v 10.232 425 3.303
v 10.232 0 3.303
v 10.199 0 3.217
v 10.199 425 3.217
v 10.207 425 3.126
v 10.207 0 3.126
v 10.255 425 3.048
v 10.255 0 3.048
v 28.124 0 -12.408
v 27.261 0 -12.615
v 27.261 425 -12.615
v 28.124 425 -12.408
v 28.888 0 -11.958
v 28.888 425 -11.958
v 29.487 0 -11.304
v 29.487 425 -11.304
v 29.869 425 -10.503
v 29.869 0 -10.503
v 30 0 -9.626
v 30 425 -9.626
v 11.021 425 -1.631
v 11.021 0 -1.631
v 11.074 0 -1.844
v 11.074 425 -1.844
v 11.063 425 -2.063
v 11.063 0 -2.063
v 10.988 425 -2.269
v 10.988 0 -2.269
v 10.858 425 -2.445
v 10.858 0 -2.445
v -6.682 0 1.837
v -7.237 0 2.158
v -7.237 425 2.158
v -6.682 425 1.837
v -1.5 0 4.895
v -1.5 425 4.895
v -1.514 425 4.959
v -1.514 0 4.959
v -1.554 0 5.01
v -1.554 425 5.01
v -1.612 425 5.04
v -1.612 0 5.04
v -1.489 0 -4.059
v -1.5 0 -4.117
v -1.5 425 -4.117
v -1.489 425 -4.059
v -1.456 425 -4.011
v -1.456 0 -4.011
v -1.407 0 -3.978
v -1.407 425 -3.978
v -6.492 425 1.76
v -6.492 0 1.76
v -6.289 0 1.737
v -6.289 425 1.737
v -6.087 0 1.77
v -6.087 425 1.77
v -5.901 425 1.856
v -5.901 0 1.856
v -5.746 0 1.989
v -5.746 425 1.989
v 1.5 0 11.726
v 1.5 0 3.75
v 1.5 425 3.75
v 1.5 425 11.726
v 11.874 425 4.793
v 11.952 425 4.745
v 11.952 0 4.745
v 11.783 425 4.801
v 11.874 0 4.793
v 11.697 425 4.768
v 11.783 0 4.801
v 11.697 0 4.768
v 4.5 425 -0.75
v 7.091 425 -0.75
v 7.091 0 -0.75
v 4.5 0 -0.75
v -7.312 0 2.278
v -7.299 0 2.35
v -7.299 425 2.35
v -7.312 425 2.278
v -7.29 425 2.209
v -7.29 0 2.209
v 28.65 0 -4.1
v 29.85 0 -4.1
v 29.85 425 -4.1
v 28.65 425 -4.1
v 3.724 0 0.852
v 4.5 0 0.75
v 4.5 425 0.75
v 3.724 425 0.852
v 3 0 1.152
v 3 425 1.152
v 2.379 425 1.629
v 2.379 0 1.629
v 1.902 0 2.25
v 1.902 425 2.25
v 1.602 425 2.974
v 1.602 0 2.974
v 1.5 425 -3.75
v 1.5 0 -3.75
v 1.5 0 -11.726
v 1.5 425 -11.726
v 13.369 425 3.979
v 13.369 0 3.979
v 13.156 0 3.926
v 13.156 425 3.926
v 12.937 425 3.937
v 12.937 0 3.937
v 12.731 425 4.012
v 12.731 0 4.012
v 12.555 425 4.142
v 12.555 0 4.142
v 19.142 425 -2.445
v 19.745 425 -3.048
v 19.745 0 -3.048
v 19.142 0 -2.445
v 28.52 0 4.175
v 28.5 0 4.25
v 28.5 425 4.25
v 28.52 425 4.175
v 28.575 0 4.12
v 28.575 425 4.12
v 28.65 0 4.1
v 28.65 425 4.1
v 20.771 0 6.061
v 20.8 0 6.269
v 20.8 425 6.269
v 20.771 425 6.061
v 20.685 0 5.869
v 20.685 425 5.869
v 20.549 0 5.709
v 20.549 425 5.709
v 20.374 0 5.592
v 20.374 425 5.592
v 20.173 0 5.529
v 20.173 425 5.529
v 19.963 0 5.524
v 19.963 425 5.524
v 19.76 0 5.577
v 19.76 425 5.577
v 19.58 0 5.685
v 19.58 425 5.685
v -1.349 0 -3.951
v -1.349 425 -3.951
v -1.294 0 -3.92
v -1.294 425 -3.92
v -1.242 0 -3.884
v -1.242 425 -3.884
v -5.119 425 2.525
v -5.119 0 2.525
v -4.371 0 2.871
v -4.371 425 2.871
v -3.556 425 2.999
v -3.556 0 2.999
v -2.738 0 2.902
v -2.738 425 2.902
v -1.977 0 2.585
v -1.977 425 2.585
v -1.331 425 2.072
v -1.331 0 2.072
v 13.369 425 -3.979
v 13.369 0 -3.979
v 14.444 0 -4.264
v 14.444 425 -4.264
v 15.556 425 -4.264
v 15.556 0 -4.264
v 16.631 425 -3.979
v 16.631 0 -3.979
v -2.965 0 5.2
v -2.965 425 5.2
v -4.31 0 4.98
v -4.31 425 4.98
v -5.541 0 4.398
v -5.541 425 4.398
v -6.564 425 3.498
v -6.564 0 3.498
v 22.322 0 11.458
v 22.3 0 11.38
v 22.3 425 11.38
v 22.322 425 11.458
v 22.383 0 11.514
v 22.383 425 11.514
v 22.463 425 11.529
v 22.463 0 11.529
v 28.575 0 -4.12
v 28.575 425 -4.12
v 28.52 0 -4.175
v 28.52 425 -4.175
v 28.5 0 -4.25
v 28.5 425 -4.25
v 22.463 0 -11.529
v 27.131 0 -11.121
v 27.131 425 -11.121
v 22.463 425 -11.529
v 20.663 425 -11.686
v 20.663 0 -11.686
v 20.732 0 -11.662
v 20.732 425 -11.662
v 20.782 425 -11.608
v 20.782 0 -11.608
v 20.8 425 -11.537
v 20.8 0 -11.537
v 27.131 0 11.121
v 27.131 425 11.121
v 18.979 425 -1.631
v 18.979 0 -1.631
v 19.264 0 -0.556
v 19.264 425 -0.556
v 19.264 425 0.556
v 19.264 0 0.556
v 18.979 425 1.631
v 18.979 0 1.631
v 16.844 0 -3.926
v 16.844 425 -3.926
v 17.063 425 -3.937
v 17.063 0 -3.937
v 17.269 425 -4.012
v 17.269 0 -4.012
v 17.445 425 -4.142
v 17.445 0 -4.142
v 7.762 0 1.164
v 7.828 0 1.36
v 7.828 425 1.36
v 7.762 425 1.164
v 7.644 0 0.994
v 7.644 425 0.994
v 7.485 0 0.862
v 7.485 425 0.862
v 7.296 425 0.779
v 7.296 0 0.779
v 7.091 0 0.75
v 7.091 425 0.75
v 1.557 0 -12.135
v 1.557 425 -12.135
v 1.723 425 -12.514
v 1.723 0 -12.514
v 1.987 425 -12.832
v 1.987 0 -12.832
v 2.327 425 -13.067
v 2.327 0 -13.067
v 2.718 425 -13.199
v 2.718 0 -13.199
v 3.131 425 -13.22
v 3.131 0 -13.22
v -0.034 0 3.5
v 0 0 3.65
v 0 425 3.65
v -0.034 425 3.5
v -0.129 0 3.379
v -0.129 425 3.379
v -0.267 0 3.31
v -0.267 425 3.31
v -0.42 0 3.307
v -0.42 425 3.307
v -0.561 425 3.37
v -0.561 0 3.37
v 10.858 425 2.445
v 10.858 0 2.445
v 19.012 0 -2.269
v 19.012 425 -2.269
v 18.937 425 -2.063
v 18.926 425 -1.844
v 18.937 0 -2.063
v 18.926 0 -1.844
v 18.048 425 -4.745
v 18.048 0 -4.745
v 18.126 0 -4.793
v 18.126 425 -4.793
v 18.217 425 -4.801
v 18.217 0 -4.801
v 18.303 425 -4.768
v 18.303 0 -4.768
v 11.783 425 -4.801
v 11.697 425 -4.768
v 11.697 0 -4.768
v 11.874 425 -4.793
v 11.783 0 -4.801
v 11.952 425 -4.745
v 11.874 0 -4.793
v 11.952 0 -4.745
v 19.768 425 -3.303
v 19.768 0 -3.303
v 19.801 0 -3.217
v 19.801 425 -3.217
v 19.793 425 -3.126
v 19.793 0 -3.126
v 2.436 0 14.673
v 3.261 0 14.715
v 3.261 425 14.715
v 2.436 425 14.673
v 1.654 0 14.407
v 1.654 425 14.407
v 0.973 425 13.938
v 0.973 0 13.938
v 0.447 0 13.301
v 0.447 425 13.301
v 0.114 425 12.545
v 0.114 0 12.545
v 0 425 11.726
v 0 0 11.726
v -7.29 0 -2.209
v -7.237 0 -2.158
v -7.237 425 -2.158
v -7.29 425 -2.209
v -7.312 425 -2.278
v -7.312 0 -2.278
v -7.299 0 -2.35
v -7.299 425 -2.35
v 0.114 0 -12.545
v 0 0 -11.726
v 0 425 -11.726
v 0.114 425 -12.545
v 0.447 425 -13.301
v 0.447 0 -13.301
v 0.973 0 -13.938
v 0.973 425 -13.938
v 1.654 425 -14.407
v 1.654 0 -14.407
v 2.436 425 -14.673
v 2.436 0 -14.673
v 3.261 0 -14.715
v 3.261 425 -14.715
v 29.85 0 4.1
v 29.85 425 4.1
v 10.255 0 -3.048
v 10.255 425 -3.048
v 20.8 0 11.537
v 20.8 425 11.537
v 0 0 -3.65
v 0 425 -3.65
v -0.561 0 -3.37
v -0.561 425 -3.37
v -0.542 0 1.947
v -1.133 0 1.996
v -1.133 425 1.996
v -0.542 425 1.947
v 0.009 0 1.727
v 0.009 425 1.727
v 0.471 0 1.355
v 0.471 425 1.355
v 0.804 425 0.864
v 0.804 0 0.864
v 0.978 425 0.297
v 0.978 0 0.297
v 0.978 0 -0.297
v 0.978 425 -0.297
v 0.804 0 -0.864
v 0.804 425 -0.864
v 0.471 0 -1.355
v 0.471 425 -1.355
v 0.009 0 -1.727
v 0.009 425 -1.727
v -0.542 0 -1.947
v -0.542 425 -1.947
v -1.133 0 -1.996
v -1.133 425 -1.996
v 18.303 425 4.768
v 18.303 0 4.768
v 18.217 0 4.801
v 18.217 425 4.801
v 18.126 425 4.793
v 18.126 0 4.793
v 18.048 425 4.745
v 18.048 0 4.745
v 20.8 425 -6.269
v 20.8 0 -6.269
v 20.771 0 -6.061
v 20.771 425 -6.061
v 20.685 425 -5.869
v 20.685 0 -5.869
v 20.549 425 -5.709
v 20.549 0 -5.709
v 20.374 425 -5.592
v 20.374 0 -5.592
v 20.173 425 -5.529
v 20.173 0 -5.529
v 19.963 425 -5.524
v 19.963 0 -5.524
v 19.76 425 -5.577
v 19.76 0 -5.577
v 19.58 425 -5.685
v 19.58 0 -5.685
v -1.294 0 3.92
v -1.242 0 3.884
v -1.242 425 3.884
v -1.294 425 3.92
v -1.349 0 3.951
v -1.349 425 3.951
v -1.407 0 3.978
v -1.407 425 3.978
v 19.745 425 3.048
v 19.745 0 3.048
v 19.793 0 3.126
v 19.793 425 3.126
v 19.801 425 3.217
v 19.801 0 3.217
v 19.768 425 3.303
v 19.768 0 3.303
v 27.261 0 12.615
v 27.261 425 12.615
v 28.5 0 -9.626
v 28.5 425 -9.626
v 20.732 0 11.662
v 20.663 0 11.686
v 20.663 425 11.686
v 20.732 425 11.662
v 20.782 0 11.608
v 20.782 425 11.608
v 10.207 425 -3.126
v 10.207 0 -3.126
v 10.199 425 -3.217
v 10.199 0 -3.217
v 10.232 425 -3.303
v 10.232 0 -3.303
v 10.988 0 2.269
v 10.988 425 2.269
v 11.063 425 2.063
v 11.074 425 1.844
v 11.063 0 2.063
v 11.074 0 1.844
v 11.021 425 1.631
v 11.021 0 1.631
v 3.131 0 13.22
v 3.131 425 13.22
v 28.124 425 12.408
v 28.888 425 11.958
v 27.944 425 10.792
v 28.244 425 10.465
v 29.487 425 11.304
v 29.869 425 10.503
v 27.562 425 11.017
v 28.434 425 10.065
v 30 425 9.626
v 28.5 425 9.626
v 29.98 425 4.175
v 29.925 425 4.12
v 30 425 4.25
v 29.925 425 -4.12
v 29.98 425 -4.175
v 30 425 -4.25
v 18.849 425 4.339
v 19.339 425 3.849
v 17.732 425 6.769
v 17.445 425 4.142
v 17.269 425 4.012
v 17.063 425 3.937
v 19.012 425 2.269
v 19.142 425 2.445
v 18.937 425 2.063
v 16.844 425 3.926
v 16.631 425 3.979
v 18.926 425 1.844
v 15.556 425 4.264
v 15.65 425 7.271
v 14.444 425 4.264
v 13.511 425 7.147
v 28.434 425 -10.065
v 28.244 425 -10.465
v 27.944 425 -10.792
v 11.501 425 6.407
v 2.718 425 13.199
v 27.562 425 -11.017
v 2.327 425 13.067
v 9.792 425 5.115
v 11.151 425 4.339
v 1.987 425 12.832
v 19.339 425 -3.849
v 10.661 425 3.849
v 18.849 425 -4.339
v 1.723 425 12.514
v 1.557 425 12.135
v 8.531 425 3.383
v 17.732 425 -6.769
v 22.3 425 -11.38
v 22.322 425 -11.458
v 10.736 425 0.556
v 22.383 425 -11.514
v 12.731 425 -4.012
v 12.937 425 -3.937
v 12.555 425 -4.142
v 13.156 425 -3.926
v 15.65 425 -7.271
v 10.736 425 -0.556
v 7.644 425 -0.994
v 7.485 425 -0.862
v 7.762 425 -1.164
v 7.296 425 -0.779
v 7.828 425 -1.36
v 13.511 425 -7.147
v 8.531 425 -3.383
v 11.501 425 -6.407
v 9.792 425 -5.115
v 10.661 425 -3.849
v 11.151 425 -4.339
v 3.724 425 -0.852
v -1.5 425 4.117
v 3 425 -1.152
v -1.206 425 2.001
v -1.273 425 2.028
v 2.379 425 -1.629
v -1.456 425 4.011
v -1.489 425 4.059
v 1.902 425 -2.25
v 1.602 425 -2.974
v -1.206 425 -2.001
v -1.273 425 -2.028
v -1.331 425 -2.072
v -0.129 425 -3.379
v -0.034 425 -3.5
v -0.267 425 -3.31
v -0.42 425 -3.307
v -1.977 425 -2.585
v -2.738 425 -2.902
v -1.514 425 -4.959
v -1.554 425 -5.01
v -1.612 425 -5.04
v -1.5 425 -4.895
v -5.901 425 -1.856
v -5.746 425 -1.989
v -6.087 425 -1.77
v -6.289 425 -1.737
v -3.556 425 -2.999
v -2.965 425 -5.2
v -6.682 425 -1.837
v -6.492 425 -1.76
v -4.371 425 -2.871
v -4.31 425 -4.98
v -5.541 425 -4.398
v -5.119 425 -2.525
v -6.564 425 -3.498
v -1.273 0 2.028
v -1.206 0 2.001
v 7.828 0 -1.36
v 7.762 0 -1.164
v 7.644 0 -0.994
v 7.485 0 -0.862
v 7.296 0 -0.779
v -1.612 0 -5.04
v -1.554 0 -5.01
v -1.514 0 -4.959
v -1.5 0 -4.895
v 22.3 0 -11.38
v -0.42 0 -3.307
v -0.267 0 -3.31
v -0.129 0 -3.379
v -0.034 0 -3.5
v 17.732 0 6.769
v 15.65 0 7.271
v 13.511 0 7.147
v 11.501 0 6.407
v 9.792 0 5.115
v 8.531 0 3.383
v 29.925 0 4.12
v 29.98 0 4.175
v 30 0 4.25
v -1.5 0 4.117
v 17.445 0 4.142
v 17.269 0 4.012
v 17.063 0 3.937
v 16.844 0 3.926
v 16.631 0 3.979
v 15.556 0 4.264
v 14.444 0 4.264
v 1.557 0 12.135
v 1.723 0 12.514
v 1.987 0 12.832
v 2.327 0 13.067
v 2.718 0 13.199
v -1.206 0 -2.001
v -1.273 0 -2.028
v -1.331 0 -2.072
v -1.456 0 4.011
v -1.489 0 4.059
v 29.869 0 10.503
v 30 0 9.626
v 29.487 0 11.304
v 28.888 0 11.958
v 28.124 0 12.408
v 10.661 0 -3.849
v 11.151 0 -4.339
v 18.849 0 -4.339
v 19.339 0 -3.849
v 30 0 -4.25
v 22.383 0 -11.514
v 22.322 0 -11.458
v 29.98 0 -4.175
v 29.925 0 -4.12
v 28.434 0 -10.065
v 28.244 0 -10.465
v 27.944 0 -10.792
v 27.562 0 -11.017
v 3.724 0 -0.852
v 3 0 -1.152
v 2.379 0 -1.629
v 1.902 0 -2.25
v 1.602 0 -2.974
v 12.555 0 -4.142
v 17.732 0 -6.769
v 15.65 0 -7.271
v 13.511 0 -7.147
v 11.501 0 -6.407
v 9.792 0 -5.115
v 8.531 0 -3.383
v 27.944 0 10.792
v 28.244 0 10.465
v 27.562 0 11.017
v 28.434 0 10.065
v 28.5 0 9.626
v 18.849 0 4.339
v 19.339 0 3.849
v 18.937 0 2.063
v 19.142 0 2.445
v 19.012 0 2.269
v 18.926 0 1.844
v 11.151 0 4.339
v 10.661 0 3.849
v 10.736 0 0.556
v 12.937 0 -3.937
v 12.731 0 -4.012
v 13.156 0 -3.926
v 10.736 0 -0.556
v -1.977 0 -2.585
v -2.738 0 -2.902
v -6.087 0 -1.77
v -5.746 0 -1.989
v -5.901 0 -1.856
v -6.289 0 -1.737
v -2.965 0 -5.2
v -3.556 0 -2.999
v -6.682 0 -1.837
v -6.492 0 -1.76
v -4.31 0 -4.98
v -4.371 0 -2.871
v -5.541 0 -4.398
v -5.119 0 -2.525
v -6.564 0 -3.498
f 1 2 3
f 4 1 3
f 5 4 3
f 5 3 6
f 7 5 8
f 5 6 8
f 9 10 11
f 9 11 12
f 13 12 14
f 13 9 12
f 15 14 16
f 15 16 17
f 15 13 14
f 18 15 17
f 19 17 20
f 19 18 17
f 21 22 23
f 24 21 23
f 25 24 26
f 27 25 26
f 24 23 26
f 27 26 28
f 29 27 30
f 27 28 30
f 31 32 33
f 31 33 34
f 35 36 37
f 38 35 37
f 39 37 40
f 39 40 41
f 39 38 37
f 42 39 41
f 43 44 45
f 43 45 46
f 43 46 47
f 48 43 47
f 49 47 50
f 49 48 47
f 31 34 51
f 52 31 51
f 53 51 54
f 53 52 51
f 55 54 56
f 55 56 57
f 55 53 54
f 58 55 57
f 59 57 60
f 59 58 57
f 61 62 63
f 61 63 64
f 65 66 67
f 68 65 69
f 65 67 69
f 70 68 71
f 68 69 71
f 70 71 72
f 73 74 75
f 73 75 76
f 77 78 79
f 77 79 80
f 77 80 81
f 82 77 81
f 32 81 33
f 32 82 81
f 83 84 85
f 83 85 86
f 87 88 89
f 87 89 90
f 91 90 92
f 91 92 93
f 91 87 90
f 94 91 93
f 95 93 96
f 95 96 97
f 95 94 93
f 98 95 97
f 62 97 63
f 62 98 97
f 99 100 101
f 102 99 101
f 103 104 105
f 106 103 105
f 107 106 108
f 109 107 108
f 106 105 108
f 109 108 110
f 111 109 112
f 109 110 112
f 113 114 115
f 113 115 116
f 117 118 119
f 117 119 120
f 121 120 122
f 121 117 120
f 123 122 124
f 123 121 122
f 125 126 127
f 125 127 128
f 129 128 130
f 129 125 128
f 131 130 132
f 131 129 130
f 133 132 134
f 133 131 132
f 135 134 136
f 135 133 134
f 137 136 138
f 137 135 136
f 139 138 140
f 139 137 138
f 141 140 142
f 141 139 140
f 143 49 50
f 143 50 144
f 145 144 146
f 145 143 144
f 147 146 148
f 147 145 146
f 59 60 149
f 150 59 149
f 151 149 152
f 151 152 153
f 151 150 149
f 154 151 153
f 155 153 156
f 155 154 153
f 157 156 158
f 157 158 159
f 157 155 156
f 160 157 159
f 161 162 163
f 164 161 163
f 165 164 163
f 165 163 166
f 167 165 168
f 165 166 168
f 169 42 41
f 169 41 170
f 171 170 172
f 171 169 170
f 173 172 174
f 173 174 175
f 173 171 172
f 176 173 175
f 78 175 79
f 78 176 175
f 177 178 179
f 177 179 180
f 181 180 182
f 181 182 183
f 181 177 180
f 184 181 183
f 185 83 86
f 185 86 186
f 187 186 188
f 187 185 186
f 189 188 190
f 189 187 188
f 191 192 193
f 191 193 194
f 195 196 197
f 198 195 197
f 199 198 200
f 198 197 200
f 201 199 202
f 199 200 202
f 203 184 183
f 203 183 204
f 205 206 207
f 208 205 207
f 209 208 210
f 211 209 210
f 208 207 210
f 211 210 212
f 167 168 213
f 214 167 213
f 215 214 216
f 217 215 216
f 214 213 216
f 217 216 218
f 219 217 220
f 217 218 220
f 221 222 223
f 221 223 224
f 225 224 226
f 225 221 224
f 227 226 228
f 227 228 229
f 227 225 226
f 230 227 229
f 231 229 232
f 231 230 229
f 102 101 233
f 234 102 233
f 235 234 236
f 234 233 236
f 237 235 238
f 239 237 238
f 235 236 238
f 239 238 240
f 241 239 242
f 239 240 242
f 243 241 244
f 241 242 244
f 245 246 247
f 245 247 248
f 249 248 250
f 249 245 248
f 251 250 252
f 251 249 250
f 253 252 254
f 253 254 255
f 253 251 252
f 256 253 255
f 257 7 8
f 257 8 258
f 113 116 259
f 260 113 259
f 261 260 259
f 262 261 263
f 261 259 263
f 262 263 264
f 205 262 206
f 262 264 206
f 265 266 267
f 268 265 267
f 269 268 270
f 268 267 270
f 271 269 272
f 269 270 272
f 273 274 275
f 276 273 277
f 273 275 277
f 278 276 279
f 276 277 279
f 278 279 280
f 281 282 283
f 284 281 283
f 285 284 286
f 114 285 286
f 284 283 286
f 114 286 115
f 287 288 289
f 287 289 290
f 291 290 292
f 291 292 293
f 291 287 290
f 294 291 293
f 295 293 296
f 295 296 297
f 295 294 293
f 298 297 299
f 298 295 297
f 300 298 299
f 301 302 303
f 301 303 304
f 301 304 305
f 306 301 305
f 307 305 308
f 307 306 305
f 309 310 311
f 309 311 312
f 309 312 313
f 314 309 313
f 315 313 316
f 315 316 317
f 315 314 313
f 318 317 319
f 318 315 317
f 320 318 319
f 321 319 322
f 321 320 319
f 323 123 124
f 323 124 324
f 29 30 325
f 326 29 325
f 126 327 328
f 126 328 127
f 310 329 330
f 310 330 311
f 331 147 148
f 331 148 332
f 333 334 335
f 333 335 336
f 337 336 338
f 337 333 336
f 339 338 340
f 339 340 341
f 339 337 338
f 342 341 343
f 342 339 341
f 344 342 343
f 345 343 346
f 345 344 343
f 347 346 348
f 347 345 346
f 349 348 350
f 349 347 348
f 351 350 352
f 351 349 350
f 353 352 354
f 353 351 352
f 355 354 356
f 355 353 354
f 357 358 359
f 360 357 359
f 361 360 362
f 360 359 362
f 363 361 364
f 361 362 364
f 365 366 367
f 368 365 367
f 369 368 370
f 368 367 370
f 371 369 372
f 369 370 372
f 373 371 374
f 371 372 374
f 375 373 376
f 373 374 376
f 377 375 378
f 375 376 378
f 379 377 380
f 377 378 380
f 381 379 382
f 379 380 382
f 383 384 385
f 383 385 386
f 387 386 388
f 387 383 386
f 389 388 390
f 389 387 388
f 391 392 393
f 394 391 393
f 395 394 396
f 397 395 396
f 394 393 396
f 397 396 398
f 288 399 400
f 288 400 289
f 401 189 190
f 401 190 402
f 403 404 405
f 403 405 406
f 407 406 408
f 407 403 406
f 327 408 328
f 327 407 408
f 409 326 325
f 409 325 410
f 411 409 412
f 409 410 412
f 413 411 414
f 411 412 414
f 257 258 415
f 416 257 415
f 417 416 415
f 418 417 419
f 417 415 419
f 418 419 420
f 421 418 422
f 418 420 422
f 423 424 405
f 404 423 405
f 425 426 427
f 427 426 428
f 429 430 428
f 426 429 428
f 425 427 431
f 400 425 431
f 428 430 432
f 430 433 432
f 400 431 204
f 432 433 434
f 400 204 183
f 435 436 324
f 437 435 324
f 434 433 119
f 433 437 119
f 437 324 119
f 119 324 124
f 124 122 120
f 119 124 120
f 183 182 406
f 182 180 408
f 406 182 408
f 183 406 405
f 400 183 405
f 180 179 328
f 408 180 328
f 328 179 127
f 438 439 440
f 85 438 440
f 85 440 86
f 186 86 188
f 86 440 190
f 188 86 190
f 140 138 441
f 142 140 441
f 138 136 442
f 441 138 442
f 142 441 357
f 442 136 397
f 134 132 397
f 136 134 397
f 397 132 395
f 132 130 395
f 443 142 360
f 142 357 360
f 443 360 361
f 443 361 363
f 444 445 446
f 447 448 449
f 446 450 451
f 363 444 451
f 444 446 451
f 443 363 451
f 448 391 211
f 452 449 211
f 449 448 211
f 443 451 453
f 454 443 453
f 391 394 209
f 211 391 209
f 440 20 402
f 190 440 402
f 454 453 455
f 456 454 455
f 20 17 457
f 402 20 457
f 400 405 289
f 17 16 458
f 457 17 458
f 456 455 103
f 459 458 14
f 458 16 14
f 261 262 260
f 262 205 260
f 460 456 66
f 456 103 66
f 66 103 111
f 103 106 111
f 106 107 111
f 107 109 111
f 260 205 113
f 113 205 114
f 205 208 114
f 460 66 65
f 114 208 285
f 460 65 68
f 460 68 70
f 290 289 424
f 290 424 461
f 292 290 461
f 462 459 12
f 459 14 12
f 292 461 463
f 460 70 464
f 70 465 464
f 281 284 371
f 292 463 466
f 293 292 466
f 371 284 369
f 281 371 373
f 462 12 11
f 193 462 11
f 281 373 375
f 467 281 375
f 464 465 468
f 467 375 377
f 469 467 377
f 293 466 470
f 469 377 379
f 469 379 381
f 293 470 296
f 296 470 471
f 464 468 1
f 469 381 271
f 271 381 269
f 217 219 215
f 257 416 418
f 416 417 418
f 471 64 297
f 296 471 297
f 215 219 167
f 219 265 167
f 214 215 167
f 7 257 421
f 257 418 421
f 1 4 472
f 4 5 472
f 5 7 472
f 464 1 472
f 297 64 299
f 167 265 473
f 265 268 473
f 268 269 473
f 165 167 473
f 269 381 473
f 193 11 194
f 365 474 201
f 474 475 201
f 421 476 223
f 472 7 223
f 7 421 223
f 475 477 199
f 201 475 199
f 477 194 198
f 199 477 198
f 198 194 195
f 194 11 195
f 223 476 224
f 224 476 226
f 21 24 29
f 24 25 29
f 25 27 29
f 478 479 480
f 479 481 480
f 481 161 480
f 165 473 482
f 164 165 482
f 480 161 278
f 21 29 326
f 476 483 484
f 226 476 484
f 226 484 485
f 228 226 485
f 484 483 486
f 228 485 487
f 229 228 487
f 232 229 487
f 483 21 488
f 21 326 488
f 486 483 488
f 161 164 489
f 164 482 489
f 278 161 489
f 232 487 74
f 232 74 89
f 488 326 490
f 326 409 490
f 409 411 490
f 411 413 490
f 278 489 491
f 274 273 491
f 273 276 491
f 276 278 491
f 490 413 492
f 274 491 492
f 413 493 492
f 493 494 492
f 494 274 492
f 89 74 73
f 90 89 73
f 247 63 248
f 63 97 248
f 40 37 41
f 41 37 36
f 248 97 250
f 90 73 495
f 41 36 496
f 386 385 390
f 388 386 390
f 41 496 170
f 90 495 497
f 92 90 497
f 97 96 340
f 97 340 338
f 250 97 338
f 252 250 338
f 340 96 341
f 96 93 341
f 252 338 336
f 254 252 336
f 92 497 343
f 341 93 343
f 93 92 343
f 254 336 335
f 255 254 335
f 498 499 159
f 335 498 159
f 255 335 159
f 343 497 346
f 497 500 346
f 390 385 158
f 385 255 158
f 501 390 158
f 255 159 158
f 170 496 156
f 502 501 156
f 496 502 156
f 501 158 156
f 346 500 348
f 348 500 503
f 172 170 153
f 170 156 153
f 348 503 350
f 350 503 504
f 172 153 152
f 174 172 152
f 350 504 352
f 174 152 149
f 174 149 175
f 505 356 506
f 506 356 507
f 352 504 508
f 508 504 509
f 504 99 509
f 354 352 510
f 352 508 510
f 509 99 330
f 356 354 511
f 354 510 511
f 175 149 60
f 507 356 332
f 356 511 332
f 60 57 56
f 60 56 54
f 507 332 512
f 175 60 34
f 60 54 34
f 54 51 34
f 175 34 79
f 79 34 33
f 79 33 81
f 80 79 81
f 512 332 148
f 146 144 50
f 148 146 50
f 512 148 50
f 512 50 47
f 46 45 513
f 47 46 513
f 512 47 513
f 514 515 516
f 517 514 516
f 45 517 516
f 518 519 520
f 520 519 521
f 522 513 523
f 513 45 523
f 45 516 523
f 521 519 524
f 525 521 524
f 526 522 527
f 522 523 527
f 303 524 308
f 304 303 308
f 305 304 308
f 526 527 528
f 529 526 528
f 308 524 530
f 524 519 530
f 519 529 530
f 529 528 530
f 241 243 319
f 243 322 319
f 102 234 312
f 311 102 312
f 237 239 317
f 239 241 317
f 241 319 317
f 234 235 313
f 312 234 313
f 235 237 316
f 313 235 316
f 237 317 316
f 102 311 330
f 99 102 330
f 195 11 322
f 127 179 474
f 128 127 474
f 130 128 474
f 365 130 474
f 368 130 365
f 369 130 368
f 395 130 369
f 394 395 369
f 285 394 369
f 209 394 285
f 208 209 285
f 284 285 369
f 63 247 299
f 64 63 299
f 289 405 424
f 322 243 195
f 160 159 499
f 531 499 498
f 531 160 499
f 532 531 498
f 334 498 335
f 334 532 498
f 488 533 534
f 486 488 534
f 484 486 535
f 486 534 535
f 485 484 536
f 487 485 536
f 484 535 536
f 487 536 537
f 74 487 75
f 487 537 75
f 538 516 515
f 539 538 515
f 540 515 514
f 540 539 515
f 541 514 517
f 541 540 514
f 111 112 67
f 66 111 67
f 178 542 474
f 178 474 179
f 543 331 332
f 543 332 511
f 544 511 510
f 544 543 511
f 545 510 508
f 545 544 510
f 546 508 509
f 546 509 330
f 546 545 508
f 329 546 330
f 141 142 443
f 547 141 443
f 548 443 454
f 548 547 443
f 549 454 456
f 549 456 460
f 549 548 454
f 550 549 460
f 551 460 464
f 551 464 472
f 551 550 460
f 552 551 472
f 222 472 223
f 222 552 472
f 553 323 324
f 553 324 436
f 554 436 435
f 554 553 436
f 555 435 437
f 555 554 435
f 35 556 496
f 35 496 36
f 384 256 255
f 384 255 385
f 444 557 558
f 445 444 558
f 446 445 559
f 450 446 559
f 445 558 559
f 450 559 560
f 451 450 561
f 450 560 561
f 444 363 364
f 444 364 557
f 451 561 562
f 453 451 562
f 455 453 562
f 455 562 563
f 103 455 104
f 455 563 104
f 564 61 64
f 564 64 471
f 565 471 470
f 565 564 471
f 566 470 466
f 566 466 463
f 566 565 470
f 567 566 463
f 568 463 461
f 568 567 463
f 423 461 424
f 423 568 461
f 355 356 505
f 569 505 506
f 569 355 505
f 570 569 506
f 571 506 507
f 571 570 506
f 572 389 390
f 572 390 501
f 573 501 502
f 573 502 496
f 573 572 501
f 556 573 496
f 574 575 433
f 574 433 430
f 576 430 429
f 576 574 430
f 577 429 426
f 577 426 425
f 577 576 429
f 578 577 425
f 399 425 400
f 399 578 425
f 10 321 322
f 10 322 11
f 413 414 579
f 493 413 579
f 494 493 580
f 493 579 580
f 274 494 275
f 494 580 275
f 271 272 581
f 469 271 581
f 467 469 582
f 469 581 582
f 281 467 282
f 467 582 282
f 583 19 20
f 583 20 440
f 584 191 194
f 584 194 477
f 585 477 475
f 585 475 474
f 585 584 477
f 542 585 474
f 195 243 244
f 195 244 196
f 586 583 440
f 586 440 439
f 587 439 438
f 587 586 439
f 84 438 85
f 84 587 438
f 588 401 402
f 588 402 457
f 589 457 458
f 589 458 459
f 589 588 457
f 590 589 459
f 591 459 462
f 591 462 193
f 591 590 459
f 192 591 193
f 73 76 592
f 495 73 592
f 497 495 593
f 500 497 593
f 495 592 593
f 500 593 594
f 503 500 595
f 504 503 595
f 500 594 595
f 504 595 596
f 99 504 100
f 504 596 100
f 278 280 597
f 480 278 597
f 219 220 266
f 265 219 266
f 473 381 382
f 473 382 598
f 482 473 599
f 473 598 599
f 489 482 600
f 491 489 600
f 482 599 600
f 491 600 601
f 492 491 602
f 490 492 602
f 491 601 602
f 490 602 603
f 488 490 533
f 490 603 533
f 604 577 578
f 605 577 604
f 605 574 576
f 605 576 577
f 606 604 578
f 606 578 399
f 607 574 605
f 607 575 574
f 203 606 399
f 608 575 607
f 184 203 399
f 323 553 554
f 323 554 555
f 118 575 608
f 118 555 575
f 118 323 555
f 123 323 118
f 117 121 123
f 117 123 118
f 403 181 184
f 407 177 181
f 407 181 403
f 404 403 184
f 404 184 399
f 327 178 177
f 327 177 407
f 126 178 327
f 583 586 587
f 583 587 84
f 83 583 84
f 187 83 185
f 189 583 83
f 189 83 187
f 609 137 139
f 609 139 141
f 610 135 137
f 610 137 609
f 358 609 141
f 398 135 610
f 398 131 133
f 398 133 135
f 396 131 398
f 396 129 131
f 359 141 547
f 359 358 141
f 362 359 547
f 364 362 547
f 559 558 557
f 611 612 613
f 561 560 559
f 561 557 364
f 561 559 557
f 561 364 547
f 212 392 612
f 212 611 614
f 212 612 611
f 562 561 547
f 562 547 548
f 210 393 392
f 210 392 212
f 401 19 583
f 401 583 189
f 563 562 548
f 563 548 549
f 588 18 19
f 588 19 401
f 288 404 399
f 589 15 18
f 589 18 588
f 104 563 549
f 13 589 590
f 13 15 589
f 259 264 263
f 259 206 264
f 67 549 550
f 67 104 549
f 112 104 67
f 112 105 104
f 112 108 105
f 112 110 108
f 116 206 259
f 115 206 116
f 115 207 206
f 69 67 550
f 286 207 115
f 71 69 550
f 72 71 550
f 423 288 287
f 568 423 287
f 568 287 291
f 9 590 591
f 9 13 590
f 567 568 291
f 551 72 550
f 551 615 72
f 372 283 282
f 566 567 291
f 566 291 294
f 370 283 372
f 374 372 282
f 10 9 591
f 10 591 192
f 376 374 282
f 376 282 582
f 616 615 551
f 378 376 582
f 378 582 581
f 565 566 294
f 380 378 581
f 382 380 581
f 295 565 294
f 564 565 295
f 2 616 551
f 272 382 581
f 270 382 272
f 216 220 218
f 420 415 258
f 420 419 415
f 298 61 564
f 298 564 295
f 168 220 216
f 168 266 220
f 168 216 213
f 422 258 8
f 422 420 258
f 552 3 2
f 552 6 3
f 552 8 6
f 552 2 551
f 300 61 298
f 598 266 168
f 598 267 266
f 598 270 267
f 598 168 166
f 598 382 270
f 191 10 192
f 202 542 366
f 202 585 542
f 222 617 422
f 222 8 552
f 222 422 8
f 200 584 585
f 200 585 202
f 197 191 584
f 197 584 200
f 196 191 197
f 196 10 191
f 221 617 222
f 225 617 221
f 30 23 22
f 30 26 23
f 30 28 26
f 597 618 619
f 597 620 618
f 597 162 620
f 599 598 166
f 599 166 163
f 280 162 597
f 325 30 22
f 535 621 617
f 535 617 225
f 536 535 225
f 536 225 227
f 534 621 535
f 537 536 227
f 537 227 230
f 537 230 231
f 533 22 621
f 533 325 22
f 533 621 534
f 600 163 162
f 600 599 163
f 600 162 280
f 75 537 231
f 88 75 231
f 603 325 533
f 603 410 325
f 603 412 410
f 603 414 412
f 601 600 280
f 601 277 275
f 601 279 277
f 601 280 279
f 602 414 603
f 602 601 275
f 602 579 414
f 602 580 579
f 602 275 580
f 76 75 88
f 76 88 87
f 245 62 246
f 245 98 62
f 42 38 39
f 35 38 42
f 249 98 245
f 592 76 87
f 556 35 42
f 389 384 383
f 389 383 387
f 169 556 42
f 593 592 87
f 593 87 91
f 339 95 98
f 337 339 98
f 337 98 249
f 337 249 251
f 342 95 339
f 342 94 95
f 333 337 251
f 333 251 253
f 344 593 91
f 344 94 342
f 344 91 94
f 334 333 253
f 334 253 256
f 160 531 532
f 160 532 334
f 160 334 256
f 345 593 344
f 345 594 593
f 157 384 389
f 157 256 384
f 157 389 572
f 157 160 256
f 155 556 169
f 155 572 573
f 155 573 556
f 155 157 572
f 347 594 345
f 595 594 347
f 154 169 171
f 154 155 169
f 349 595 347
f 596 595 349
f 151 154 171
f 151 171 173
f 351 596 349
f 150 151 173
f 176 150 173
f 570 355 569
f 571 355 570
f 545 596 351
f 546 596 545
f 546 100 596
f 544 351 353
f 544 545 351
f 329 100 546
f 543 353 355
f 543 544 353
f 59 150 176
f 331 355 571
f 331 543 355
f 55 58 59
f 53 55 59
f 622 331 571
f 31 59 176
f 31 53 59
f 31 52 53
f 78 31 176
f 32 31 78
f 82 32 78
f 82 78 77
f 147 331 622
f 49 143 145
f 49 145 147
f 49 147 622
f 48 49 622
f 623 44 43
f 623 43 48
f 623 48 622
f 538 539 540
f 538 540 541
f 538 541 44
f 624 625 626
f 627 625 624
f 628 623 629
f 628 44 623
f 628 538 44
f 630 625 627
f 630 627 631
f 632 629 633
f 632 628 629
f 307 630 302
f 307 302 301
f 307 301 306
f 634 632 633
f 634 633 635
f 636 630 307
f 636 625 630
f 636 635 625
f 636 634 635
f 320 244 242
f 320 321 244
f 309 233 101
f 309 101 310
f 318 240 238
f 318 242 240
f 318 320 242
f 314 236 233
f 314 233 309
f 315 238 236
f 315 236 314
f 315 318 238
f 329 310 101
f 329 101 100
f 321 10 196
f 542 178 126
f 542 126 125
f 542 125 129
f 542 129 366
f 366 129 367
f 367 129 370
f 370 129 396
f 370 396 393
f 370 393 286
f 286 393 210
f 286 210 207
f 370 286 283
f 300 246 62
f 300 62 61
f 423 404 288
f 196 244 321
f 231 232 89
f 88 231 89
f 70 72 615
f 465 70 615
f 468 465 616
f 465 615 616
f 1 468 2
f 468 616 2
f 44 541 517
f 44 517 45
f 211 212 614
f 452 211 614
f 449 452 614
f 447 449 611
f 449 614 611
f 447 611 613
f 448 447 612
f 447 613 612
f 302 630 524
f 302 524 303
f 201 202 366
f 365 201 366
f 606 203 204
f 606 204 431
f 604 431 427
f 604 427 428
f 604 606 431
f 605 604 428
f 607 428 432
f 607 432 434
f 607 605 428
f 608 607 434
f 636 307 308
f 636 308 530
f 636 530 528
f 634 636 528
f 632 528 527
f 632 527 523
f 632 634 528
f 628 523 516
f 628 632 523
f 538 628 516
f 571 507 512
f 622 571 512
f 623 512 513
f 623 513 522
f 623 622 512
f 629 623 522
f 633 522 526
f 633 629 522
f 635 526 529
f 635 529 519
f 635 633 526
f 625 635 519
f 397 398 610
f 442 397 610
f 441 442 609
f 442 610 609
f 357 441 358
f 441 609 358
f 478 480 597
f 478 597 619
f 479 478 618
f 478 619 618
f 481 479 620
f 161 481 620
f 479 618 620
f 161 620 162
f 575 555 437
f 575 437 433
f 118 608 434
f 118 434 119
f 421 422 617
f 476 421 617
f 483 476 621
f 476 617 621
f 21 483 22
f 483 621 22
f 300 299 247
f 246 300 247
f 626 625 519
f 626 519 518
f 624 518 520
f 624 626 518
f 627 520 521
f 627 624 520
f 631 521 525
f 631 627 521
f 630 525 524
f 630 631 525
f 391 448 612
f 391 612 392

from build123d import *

# Parameters (mm, degrees)
BOSS_EXTRUDE1_DEPTH = 425


with BuildPart() as part:
    # Sketch1 → Boss-Extrude1 (new body)
    with BuildSketch(Plane(origin=(0, 0, 0), x_dir=(1, 0, 0), z_dir=(0, 1, 0))):
        with BuildLine():
            Line((0, 3.65), (0, 11.726074497))
            ThreePointArc((0, 11.726074497), (0.973229377, 13.937906507), (3.261467228, 14.714658591))
            Line((3.261467228, 14.714658591), (27.261467228, 12.614930666))
            ThreePointArc((27.261467228, 12.614930666), (29.21183201, 11.653117195), (30, 9.626346572))
            Line((30, 9.626346572), (30, 4.25))
            ThreePointArc((30, 4.25), (29.956066017, 4.143933983), (29.85, 4.1))
            Line((29.85, 4.1), (28.65, 4.1))
            ThreePointArc((28.65, 4.1), (28.543933983, 4.143933983), (28.5, 4.25))
            Line((28.5, 4.25), (28.5, 9.626346572))
            ThreePointArc((28.5, 9.626346572), (28.105916005, 10.639731884), (27.130733614, 11.120638619))
            Line((27.130733614, 11.120638619), (22.463073361, 11.529005977))
            ThreePointArc((22.463073361, 11.529005977), (22.348661469, 11.490168372), (22.3, 11.379576772))
            Line((22.3, 11.379576772), (22.3, -11.379576772))
            ThreePointArc((22.3, -11.379576772), (22.348661469, -11.490168372), (22.463073361, -11.529005977))
            Line((22.463073361, -11.529005977), (27.130733614, -11.120638619))
            ThreePointArc((27.130733614, -11.120638619), (28.105916005, -10.639731884), (28.5, -9.626346572))
            Line((28.5, -9.626346572), (28.5, -4.25))
            ThreePointArc((28.5, -4.25), (28.543933983, -4.143933983), (28.65, -4.1))
            Line((28.65, -4.1), (29.85, -4.1))
            ThreePointArc((29.85, -4.1), (29.956066017, -4.143933983), (30, -4.25))
            Line((30, -4.25), (30, -9.626346572))
            ThreePointArc((30, -9.626346572), (29.21183201, -11.653117195), (27.261467228, -12.614930666))
            Line((27.261467228, -12.614930666), (3.261467228, -14.714658591))
            ThreePointArc((3.261467228, -14.714658591), (0.973229377, -13.937906507), (0, -11.726074497))
            Line((0, -11.726074497), (0, -3.65))
            ThreePointArc((0, -3.65), (-0.193830765, -3.336772973), (-0.560635258, -3.370477571))
            Line((-0.560635258, -3.370477571), (-1.241594271, -3.883616994))
            ThreePointArc((-1.241594271, -3.883616994), (-1.321364591, -3.936115739), (-1.407159256, -3.978052566))
            ThreePointArc((-1.407159256, -3.978052566), (-1.474647279, -4.03329008), (-1.5, -4.116735006))
            Line((-1.5, -4.116735006), (-1.5, -4.895206856))
            ThreePointArc((-1.5, -4.895206856), (-1.531192993, -4.986775929), (-1.611798603, -5.040260823))
            ThreePointArc((-1.611798603, -5.040260823), (-4.945770747, -4.732123456), (-7.298777867, -2.350175433))
            ThreePointArc((-7.298777867, -2.350175433), (-7.305313905, -2.242111424), (-7.237408738, -2.157793941))
            Line((-7.237408738, -2.157793941), (-6.681980515, -1.837117307))
            ThreePointArc((-6.681980515, -1.837117307), (-6.186662348, -1.74635024), (-5.745584412, -1.989309088))
            ThreePointArc((-5.745584412, -1.989309088), (-3.556386599, -2.999470045), (-1.330769231, -2.072302553))
            ThreePointArc((-1.330769231, -2.072302553), (-1.240582163, -2.011981832), (-1.133333333, -1.995550606))
            ThreePointArc((-1.133333333, -1.995550606), (1, 0), (-1.133333333, 1.995550606))
            ThreePointArc((-1.133333333, 1.995550606), (-1.240582163, 2.011981832), (-1.330769231, 2.072302553))
            ThreePointArc((-1.330769231, 2.072302553), (-3.556386599, 2.999470045), (-5.745584412, 1.989309088))
            ThreePointArc((-5.745584412, 1.989309088), (-6.186662348, 1.74635024), (-6.681980515, 1.837117307))
            Line((-6.681980515, 1.837117307), (-7.237408738, 2.157793941))
            ThreePointArc((-7.237408738, 2.157793941), (-7.305313905, 2.242111424), (-7.298777867, 2.350175433))
            ThreePointArc((-7.298777867, 2.350175433), (-4.945770747, 4.732123456), (-1.611798603, 5.040260823))
            ThreePointArc((-1.611798603, 5.040260823), (-1.531192993, 4.986775929), (-1.5, 4.895206856))
            Line((-1.5, 4.895206856), (-1.5, 4.116735006))
            ThreePointArc((-1.5, 4.116735006), (-1.474647279, 4.03329008), (-1.407159256, 3.978052566))
            ThreePointArc((-1.407159256, 3.978052566), (-1.321364591, 3.936115739), (-1.241594271, 3.883616994))
            Line((-1.241594271, 3.883616994), (-0.560635258, 3.370477571))
            ThreePointArc((-0.560635258, 3.370477571), (-0.193830765, 3.336772973), (0, 3.65))
        make_face()
        with BuildLine():
            Line((1.5, 3.75), (1.5, 11.726074497))
            ThreePointArc((1.5, 11.726074497), (1.986614689, 12.831990502), (3.130733614, 13.220366544))
            Line((3.130733614, 13.220366544), (20.663073361, 11.686485571))
            ThreePointArc((20.663073361, 11.686485571), (20.760591601, 11.638394897), (20.8, 11.537056366))
            Line((20.8, 11.537056366), (20.8, 6.268971207))
            ThreePointArc((20.8, 6.268971207), (20.373749385, 5.592446015), (19.579503106, 5.684905567))
            ThreePointArc((19.579503106, 5.684905567), (12.478865683, 6.850830735), (7.827850799, 1.360248447))
            ThreePointArc((7.827850799, 1.360248447), (7.569361706, 0.92236964), (7.090986155, 0.75))
            Line((7.090986155, 0.75), (4.5, 0.75))
            ThreePointArc((4.5, 0.75), (2.378679656, 1.628679656), (1.5, 3.75))
        make_face(mode=Mode.SUBTRACT)
        with BuildLine():
            Line((3.130733614, -13.220366544), (20.663073361, -11.686485571))
            ThreePointArc((20.663073361, -11.686485571), (20.760591601, -11.638394897), (20.8, -11.537056366))
            Line((20.8, -11.537056366), (20.8, -6.268971207))
            ThreePointArc((20.8, -6.268971207), (20.373749385, -5.592446015), (19.579503106, -5.684905567))
            ThreePointArc((19.579503106, -5.684905567), (12.478865683, -6.850830735), (7.827850799, -1.360248447))
            ThreePointArc((7.827850799, -1.360248447), (7.569361706, -0.92236964), (7.090986155, -0.75))
            Line((7.090986155, -0.75), (4.5, -0.75))
            ThreePointArc((4.5, -0.75), (2.378679656, -1.628679656), (1.5, -3.75))
            Line((1.5, -3.75), (1.5, -11.726074497))
            ThreePointArc((1.5, -11.726074497), (1.986614689, -12.831990502), (3.130733614, -13.220366544))
        make_face(mode=Mode.SUBTRACT)
        with BuildLine():
            Line((11.95237619, 4.744680085), (12.554594319, 4.142461956))
            ThreePointArc((12.554594319, 4.142461956), (12.93723035, 3.937478186), (13.369341573, 3.978813026))
            ThreePointArc((13.369341573, 3.978813026), (15, 4.3), (16.630658427, 3.978813026))
            ThreePointArc((16.630658427, 3.978813026), (17.06276965, 3.937478186), (17.445405681, 4.142461956))
            Line((17.445405681, 4.142461956), (18.04762381, 4.744680085))
            ThreePointArc((18.04762381, 4.744680085), (18.171115834, 4.802453455), (18.302939637, 4.767660826))
            ThreePointArc((18.302939637, 4.767660826), (19.101219331, 4.101219331), (19.767660826, 3.302939637))
            ThreePointArc((19.767660826, 3.302939637), (19.802453455, 3.171115834), (19.744680085, 3.04762381))
            Line((19.744680085, 3.04762381), (19.142461956, 2.445405681))
            ThreePointArc((19.142461956, 2.445405681), (18.937478186, 2.06276965), (18.978813026, 1.630658427))
            ThreePointArc((18.978813026, 1.630658427), (19.3, 0), (18.978813026, -1.630658427))
            ThreePointArc((18.978813026, -1.630658427), (18.937478186, -2.06276965), (19.142461956, -2.445405681))
            Line((19.142461956, -2.445405681), (19.744680085, -3.04762381))
            ThreePointArc((19.744680085, -3.04762381), (19.802453455, -3.171115834), (19.767660826, -3.302939637))
            ThreePointArc((19.767660826, -3.302939637), (19.101219331, -4.101219331), (18.302939637, -4.767660826))
            ThreePointArc((18.302939637, -4.767660826), (18.171115834, -4.802453455), (18.04762381, -4.744680085))
            Line((18.04762381, -4.744680085), (17.445405681, -4.142461956))
            ThreePointArc((17.445405681, -4.142461956), (17.06276965, -3.937478186), (16.630658427, -3.978813026))
            ThreePointArc((16.630658427, -3.978813026), (15, -4.3), (13.369341573, -3.978813026))
            ThreePointArc((13.369341573, -3.978813026), (12.93723035, -3.937478186), (12.554594319, -4.142461956))
            Line((12.554594319, -4.142461956), (11.95237619, -4.744680085))
            ThreePointArc((11.95237619, -4.744680085), (11.828884166, -4.802453455), (11.697060363, -4.767660826))
            ThreePointArc((11.697060363, -4.767660826), (10.898780669, -4.101219331), (10.232339174, -3.302939637))
            ThreePointArc((10.232339174, -3.302939637), (10.197546545, -3.171115834), (10.255319915, -3.04762381))
            Line((10.255319915, -3.04762381), (10.857538044, -2.445405681))
            ThreePointArc((10.857538044, -2.445405681), (11.062521814, -2.06276965), (11.021186974, -1.630658427))
            ThreePointArc((11.021186974, -1.630658427), (10.7, 0), (11.021186974, 1.630658427))
            ThreePointArc((11.021186974, 1.630658427), (11.062521814, 2.06276965), (10.857538044, 2.445405681))
            Line((10.857538044, 2.445405681), (10.255319915, 3.04762381))
            ThreePointArc((10.255319915, 3.04762381), (10.197546545, 3.171115834), (10.232339174, 3.302939637))
            ThreePointArc((10.232339174, 3.302939637), (10.898780669, 4.101219331), (11.697060363, 4.767660826))
            ThreePointArc((11.697060363, 4.767660826), (11.828884166, 4.802453455), (11.95237619, 4.744680085))
        make_face(mode=Mode.SUBTRACT)
    extrude(amount=BOSS_EXTRUDE1_DEPTH)


solid = part.part
